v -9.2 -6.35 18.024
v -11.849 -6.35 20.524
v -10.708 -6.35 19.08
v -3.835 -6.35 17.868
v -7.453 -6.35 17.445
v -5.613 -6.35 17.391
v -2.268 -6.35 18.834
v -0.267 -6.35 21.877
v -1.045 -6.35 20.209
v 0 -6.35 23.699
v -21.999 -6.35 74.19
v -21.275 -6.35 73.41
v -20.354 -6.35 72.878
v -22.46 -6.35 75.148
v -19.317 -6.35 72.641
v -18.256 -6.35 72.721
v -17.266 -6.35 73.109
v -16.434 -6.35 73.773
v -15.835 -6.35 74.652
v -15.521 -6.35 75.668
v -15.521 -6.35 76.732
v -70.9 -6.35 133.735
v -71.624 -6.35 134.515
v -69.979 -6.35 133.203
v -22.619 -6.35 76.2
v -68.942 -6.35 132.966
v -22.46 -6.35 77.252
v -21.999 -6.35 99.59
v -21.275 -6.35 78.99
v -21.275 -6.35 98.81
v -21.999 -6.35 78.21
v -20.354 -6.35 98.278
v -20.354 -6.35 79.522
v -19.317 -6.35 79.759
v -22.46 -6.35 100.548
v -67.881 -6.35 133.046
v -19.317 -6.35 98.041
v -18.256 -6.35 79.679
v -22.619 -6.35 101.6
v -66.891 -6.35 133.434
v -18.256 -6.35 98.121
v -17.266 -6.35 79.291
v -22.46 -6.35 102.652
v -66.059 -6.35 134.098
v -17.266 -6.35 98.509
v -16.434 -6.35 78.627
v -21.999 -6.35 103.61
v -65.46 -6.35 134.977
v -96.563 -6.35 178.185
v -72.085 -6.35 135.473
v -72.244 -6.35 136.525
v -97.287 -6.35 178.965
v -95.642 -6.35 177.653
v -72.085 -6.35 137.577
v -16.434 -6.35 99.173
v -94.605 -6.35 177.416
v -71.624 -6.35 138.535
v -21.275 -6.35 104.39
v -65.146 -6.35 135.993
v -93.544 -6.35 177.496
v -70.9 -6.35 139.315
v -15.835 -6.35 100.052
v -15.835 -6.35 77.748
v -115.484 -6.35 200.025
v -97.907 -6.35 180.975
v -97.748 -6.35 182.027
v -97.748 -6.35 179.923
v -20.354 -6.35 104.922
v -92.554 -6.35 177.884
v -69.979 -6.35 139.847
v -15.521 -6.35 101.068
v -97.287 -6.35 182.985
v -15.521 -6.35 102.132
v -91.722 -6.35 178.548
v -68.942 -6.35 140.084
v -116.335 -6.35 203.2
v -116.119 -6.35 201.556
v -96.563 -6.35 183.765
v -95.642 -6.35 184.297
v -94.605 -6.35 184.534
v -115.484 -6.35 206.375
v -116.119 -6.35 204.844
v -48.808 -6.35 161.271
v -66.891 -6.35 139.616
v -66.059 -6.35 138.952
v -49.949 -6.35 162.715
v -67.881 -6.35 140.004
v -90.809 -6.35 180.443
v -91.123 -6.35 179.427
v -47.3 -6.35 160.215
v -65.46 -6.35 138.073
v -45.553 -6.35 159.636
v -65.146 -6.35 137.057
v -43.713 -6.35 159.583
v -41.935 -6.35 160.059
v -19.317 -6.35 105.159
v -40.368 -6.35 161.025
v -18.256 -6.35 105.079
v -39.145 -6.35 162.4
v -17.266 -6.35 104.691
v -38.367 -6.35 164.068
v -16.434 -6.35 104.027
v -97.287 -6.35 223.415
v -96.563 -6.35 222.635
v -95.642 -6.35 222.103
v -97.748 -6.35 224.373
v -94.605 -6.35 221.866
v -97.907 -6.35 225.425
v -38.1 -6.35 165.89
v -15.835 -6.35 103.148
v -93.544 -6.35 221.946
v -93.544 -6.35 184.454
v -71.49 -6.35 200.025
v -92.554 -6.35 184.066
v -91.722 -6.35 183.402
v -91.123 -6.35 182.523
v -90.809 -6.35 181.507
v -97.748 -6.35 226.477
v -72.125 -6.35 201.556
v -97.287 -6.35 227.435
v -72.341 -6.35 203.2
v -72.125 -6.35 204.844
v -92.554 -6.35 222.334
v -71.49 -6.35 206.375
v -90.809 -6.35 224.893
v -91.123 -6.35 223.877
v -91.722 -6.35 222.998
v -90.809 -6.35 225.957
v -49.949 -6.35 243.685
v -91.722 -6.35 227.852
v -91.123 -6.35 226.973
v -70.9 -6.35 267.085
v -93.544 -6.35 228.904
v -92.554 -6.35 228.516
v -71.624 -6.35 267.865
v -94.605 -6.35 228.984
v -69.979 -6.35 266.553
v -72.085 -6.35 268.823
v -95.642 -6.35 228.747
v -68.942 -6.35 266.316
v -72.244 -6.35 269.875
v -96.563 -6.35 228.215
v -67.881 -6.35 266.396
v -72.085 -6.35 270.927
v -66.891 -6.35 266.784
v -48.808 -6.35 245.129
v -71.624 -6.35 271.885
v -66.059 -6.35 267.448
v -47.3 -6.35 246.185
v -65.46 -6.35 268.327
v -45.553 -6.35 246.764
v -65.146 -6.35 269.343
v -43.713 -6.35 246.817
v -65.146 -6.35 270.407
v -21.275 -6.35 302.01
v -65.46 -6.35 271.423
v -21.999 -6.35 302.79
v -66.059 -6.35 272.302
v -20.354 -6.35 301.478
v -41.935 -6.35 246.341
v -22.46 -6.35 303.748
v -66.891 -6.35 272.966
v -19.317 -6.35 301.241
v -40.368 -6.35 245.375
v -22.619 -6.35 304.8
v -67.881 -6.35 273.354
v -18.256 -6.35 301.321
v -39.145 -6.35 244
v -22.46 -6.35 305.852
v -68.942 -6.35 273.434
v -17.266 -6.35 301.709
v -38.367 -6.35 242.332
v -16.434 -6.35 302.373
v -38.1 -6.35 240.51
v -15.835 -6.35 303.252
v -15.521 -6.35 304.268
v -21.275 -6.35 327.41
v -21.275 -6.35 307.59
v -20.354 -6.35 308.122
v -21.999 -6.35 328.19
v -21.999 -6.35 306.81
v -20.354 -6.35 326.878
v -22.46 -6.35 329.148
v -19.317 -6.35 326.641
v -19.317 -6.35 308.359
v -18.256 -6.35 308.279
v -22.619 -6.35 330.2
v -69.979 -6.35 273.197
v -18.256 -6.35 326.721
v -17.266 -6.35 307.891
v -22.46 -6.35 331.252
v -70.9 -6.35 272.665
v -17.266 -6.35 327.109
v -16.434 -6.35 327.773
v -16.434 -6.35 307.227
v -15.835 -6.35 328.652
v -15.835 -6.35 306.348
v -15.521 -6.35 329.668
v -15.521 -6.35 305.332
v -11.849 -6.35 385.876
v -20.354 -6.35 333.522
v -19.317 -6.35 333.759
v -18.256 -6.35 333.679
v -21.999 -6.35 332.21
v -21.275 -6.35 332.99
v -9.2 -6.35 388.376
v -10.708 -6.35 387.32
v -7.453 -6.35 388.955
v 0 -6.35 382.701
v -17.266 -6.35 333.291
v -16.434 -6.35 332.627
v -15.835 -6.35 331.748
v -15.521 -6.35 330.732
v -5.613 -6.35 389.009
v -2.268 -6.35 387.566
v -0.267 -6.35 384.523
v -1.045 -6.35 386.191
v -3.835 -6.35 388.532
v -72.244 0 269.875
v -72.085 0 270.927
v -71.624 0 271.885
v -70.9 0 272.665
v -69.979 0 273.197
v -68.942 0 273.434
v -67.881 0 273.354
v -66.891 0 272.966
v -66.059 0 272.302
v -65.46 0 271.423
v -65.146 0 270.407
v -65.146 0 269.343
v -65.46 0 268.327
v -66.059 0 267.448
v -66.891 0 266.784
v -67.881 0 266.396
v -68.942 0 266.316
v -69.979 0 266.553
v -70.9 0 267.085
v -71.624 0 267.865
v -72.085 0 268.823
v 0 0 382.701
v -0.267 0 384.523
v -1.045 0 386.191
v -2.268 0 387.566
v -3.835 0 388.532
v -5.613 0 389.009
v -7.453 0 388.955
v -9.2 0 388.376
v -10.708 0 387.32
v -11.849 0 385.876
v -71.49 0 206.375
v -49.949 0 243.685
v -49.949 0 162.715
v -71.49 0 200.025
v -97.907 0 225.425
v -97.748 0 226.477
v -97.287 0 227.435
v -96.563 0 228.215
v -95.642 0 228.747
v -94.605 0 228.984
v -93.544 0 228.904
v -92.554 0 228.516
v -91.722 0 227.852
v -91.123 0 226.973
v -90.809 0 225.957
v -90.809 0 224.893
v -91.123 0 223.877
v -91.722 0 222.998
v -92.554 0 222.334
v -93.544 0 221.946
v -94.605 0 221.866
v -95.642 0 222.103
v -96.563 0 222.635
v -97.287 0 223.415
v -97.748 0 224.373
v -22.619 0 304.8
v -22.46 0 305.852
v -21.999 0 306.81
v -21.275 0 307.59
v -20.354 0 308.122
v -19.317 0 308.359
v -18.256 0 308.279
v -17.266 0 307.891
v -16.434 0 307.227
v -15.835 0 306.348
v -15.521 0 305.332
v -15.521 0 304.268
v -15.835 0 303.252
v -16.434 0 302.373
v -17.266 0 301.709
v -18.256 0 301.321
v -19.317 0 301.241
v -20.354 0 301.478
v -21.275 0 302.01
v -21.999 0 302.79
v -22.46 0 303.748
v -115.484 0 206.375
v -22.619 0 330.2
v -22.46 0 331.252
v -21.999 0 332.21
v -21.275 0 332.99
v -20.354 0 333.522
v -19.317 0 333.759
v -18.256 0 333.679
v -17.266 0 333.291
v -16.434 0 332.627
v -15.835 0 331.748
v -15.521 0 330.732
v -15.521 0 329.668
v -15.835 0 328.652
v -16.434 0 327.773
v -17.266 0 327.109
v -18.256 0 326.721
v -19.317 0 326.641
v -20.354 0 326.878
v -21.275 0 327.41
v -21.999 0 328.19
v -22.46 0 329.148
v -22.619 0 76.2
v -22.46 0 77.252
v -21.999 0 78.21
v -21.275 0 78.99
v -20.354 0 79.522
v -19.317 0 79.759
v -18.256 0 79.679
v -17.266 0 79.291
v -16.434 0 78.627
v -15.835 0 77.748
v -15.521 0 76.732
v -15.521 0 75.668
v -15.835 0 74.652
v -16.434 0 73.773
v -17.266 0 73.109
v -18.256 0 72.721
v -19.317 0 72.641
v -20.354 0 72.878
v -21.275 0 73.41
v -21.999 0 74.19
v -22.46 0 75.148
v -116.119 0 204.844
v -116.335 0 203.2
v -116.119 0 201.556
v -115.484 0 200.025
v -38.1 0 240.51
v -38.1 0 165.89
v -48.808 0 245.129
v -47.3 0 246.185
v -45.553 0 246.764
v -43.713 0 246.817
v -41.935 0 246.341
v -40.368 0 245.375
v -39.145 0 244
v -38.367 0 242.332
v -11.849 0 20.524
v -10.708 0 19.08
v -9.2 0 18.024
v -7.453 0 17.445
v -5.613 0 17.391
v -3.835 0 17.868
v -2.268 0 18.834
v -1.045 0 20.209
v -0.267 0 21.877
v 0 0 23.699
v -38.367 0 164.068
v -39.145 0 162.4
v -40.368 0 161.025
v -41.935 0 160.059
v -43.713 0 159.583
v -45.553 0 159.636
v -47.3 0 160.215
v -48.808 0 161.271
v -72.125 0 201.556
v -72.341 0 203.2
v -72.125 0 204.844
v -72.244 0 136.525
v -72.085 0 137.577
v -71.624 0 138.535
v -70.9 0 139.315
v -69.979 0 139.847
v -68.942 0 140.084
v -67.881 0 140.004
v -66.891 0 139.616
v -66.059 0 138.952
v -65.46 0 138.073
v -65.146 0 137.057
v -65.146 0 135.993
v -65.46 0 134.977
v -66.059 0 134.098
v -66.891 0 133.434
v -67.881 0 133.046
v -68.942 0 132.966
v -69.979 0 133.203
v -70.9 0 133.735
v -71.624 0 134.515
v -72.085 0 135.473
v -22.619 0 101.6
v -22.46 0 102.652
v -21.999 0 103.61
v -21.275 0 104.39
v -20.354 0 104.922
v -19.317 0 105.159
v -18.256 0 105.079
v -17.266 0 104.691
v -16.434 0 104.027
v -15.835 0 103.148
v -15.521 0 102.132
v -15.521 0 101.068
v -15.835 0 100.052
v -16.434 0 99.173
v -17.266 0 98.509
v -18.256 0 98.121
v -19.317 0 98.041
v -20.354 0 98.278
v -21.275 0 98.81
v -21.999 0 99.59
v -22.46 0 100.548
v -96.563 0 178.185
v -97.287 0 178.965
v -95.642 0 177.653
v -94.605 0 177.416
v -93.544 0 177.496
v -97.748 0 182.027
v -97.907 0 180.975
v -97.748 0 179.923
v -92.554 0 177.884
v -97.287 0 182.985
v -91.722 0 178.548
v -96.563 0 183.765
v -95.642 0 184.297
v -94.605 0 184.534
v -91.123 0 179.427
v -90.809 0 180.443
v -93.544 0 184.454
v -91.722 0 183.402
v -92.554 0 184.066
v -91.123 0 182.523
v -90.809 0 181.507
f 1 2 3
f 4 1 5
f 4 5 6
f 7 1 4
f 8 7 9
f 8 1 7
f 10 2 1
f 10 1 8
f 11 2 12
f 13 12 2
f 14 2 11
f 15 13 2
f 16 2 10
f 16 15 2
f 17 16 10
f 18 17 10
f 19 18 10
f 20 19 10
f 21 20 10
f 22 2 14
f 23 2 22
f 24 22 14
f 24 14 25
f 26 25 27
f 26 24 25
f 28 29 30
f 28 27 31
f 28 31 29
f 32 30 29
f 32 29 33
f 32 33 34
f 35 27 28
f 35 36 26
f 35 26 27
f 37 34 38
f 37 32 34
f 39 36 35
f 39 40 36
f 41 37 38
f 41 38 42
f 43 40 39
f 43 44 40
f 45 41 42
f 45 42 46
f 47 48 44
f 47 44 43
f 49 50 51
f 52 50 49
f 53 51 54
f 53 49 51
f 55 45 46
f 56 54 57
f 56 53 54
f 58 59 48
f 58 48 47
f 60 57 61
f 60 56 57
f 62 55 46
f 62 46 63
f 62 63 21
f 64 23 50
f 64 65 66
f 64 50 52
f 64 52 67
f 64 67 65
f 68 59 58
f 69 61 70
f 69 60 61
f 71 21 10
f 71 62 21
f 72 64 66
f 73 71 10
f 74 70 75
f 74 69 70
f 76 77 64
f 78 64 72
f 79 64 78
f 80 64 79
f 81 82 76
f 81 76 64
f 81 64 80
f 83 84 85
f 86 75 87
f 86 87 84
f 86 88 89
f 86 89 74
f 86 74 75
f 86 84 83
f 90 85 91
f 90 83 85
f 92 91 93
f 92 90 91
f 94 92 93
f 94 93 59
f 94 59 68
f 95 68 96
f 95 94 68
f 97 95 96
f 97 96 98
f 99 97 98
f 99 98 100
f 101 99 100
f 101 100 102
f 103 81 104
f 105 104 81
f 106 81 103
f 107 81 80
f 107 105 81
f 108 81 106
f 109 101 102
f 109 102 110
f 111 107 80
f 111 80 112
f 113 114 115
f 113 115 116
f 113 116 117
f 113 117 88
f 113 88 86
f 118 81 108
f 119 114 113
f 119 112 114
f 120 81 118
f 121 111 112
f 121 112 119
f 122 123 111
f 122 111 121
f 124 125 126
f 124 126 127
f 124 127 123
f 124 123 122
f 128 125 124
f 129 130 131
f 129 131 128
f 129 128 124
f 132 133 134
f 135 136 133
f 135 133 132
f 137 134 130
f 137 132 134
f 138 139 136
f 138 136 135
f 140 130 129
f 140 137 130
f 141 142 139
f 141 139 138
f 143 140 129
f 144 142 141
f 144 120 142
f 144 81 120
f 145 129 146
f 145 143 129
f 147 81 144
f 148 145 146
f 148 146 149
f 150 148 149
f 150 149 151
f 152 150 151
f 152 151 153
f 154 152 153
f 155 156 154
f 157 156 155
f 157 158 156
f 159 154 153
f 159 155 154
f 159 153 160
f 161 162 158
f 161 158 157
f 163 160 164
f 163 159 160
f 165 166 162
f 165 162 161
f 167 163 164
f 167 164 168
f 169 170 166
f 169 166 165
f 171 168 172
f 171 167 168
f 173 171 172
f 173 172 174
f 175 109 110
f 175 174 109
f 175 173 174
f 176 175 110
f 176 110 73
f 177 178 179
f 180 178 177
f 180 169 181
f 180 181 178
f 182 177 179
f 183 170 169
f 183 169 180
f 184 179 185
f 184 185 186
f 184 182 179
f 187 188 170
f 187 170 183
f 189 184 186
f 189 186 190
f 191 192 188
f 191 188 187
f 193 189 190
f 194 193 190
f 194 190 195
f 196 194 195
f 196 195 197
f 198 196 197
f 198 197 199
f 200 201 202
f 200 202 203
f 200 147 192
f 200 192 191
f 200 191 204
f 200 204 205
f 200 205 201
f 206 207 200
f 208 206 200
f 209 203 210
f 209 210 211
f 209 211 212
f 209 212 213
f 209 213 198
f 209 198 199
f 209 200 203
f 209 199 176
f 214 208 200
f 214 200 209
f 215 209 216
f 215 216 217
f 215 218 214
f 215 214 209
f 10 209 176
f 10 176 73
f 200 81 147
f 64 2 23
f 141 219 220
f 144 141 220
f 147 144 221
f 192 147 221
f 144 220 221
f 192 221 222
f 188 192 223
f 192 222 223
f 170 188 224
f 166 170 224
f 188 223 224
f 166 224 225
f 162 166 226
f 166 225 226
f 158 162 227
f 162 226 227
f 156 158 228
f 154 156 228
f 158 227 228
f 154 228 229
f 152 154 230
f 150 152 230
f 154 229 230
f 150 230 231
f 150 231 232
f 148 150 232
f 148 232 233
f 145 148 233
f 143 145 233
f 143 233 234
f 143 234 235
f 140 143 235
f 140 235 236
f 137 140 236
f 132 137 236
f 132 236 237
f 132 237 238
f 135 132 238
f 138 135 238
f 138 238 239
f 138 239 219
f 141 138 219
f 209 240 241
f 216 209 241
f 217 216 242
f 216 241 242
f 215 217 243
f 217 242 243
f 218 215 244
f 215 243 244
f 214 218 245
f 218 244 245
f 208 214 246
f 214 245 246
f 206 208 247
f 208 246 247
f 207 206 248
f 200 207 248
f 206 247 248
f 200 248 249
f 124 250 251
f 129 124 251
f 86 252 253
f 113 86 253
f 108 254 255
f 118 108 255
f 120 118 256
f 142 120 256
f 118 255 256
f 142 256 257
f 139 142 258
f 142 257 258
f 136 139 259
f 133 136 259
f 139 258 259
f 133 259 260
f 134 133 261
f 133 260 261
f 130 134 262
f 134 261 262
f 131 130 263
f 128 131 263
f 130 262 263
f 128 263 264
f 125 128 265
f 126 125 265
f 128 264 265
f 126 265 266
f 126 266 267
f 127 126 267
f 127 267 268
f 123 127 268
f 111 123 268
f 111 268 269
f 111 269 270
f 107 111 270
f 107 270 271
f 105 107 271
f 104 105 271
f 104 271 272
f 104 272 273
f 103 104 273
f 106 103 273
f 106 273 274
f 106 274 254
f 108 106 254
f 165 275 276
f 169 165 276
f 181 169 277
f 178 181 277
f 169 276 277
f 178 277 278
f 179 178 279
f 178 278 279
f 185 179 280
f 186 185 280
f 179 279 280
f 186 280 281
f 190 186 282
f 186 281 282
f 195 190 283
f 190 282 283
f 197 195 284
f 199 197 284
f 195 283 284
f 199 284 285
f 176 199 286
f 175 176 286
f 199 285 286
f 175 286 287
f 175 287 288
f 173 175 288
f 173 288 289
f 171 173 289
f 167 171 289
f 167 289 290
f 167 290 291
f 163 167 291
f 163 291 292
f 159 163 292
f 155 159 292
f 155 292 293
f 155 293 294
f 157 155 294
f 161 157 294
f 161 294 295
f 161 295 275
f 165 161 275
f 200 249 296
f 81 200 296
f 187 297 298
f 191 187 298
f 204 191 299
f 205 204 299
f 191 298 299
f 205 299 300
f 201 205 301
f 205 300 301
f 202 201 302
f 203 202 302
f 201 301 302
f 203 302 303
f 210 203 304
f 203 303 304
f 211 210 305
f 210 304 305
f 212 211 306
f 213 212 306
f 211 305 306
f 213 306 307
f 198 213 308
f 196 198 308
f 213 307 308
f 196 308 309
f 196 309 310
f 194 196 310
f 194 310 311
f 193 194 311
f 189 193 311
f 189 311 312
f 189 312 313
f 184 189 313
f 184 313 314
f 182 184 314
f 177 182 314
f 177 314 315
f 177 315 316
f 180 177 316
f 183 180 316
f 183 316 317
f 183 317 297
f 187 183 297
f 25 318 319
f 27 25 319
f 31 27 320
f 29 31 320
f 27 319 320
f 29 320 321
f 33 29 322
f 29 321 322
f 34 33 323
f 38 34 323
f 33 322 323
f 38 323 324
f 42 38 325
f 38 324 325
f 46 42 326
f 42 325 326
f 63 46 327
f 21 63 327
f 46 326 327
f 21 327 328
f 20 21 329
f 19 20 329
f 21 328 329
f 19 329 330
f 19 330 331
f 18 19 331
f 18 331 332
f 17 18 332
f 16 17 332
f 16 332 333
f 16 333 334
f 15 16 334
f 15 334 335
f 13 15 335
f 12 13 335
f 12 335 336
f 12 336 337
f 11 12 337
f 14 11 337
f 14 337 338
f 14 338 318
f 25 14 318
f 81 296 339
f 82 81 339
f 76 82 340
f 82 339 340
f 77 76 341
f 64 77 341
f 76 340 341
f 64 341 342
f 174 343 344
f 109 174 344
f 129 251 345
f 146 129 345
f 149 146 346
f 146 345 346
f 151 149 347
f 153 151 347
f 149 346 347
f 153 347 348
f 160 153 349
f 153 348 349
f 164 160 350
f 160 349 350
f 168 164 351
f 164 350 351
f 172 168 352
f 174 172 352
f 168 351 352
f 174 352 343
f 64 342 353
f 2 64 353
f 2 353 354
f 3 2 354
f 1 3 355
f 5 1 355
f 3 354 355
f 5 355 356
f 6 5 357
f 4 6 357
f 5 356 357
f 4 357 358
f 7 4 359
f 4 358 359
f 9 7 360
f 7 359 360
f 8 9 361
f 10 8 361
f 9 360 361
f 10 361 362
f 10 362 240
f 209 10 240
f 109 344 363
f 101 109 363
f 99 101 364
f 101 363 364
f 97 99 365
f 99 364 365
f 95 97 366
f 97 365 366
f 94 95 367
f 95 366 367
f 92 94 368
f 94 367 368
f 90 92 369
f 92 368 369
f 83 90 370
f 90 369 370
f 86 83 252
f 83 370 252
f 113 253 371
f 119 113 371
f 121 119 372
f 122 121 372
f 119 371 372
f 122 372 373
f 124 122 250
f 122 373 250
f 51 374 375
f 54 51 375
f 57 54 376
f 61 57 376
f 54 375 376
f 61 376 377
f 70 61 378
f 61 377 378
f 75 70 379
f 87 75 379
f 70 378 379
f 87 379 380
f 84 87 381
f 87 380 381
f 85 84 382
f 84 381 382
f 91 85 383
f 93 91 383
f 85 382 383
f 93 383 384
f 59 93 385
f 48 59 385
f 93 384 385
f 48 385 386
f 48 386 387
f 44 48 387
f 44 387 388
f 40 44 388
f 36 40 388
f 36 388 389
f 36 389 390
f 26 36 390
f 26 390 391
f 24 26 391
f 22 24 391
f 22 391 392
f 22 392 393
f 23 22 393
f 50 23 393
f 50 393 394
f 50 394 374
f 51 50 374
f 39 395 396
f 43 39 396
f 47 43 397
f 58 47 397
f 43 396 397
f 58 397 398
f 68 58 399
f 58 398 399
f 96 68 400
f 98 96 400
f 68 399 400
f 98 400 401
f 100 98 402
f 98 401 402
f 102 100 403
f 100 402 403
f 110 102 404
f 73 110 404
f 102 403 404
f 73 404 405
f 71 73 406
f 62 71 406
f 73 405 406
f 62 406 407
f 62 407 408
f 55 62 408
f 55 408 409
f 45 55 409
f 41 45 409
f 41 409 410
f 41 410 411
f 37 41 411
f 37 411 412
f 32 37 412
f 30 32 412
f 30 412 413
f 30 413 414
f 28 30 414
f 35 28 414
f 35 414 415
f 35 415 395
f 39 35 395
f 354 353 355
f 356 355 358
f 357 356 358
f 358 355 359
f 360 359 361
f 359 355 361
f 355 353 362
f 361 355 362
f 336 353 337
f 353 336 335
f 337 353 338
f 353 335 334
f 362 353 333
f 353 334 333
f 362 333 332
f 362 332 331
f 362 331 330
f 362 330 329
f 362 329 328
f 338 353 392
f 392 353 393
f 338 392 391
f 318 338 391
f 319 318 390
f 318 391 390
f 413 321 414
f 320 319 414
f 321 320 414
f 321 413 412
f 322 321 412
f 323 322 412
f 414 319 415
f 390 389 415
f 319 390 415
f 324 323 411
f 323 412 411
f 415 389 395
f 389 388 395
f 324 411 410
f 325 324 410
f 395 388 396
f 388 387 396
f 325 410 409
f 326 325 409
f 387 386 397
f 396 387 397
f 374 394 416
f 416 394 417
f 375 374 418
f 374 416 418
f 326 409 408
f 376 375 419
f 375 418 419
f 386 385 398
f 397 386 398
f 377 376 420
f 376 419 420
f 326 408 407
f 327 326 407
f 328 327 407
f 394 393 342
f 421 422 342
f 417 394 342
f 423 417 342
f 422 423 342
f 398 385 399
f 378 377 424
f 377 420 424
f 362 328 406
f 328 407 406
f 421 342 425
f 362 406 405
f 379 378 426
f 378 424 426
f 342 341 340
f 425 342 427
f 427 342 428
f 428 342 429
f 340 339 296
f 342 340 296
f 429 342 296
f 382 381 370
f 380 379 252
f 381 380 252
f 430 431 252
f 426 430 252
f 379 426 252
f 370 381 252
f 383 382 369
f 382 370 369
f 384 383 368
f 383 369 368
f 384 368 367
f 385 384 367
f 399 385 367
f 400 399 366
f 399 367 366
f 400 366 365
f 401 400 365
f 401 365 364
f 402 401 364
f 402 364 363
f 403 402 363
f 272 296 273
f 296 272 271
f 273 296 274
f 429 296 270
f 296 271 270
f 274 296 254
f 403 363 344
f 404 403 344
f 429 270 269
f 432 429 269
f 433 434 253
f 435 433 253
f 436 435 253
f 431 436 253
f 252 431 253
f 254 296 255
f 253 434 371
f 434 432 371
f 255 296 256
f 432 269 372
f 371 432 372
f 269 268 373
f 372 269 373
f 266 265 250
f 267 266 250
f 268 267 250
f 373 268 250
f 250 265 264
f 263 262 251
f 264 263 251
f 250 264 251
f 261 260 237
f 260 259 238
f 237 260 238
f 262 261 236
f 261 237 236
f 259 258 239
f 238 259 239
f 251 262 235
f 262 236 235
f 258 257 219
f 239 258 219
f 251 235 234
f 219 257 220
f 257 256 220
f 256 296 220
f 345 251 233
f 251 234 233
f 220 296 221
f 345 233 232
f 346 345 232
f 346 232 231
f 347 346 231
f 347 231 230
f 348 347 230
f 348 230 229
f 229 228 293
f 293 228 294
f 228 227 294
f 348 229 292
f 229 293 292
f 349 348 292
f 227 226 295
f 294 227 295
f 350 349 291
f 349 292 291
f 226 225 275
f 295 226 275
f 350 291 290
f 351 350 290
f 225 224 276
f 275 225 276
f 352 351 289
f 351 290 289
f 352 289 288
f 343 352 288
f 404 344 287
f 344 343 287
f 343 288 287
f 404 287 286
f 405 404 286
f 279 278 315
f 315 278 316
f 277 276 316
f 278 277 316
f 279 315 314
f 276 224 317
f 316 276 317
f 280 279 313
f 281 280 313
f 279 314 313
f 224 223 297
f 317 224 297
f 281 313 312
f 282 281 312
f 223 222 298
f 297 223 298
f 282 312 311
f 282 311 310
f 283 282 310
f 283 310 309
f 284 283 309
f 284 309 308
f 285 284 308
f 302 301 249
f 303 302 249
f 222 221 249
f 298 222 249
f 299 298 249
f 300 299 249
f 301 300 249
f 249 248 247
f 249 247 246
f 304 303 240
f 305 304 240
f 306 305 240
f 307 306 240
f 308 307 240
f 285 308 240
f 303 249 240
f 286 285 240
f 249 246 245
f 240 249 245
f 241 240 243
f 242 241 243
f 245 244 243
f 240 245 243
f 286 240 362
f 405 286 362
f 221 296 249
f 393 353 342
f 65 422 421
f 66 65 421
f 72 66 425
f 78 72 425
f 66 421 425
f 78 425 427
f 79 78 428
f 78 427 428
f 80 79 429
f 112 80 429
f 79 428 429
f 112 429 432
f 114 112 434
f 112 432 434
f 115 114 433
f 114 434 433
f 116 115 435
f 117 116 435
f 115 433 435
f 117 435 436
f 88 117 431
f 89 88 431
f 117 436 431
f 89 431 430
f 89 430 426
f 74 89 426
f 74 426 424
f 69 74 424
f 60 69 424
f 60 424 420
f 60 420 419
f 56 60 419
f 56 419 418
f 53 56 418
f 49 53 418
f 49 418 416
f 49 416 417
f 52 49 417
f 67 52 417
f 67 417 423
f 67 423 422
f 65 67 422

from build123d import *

# Parameters (mm, degrees)
F1_DEPTH = 6.35
F3_D     = 7.1374
F3_DEPTH = 304.8
F3_TIP   = 2.1442912911


# Not quite as in the source:
# - a feature names something its author has since deleted; it is built from what else it names


with BuildPart() as f1:
    # F0 (on Front) → F1 (new body)
    with BuildSketch(Plane.XZ):
        with BuildLine():
            ThreePointArc((-11.849261314, 20.5235226281), (-4.7064990636, 17.5648936311), (0, 23.6985226281))
            Line((0, 23.6985226281), (0, 382.7014773719))
            ThreePointArc((0, 382.7014773719), (-4.7064990636, 388.8351063689), (-11.849261314, 385.8764773719))
            Line((-11.849261314, 385.8764773719), (-115.4844875947, 206.375))
            ThreePointArc((-115.4844875947, 206.375), (-116.3352262806, 203.2), (-115.4844875947, 200.025))
            Line((-115.4844875947, 200.025), (-11.849261314, 20.5235226281))
        make_face()
        with BuildLine():
            ThreePointArc((-49.949261314, 243.6853416036), (-42.8064990636, 246.6439706005), (-38.1, 240.5103416036))
            Line((-38.1, 240.5103416036), (-38.1, 165.8896583964))
            ThreePointArc((-38.1, 165.8896583964), (-42.8064990636, 159.7560293995), (-49.949261314, 162.7146583964))
            Line((-49.949261314, 162.7146583964), (-71.4903970824, 200.025))
            ThreePointArc((-71.4903970824, 200.025), (-72.3411357684, 203.2), (-71.4903970824, 206.375))
            Line((-71.4903970824, 206.375), (-49.949261314, 243.6853416036))
        make_face(mode=Mode.SUBTRACT)
    extrude(amount=F1_DEPTH)

    # F3
    with Locations(Plane.XZ.offset(6.35)):
        with Locations((-94.3381810245, 225.425), (-94.3381810245, 180.975), (-19.05, 304.8), (-19.05, 101.6), (-19.05, 76.2), (-19.05, 330.2), (-68.674961559, 269.875), (-68.674961559, 136.525)):
            Hole(F3_D / 2, depth=F3_DEPTH)
            with Locations((0, 0, -(F3_DEPTH + F3_TIP / 2))):  # 118° drill point
                Cone(0, F3_D / 2, F3_TIP, mode=Mode.SUBTRACT)


solid = f1.part
